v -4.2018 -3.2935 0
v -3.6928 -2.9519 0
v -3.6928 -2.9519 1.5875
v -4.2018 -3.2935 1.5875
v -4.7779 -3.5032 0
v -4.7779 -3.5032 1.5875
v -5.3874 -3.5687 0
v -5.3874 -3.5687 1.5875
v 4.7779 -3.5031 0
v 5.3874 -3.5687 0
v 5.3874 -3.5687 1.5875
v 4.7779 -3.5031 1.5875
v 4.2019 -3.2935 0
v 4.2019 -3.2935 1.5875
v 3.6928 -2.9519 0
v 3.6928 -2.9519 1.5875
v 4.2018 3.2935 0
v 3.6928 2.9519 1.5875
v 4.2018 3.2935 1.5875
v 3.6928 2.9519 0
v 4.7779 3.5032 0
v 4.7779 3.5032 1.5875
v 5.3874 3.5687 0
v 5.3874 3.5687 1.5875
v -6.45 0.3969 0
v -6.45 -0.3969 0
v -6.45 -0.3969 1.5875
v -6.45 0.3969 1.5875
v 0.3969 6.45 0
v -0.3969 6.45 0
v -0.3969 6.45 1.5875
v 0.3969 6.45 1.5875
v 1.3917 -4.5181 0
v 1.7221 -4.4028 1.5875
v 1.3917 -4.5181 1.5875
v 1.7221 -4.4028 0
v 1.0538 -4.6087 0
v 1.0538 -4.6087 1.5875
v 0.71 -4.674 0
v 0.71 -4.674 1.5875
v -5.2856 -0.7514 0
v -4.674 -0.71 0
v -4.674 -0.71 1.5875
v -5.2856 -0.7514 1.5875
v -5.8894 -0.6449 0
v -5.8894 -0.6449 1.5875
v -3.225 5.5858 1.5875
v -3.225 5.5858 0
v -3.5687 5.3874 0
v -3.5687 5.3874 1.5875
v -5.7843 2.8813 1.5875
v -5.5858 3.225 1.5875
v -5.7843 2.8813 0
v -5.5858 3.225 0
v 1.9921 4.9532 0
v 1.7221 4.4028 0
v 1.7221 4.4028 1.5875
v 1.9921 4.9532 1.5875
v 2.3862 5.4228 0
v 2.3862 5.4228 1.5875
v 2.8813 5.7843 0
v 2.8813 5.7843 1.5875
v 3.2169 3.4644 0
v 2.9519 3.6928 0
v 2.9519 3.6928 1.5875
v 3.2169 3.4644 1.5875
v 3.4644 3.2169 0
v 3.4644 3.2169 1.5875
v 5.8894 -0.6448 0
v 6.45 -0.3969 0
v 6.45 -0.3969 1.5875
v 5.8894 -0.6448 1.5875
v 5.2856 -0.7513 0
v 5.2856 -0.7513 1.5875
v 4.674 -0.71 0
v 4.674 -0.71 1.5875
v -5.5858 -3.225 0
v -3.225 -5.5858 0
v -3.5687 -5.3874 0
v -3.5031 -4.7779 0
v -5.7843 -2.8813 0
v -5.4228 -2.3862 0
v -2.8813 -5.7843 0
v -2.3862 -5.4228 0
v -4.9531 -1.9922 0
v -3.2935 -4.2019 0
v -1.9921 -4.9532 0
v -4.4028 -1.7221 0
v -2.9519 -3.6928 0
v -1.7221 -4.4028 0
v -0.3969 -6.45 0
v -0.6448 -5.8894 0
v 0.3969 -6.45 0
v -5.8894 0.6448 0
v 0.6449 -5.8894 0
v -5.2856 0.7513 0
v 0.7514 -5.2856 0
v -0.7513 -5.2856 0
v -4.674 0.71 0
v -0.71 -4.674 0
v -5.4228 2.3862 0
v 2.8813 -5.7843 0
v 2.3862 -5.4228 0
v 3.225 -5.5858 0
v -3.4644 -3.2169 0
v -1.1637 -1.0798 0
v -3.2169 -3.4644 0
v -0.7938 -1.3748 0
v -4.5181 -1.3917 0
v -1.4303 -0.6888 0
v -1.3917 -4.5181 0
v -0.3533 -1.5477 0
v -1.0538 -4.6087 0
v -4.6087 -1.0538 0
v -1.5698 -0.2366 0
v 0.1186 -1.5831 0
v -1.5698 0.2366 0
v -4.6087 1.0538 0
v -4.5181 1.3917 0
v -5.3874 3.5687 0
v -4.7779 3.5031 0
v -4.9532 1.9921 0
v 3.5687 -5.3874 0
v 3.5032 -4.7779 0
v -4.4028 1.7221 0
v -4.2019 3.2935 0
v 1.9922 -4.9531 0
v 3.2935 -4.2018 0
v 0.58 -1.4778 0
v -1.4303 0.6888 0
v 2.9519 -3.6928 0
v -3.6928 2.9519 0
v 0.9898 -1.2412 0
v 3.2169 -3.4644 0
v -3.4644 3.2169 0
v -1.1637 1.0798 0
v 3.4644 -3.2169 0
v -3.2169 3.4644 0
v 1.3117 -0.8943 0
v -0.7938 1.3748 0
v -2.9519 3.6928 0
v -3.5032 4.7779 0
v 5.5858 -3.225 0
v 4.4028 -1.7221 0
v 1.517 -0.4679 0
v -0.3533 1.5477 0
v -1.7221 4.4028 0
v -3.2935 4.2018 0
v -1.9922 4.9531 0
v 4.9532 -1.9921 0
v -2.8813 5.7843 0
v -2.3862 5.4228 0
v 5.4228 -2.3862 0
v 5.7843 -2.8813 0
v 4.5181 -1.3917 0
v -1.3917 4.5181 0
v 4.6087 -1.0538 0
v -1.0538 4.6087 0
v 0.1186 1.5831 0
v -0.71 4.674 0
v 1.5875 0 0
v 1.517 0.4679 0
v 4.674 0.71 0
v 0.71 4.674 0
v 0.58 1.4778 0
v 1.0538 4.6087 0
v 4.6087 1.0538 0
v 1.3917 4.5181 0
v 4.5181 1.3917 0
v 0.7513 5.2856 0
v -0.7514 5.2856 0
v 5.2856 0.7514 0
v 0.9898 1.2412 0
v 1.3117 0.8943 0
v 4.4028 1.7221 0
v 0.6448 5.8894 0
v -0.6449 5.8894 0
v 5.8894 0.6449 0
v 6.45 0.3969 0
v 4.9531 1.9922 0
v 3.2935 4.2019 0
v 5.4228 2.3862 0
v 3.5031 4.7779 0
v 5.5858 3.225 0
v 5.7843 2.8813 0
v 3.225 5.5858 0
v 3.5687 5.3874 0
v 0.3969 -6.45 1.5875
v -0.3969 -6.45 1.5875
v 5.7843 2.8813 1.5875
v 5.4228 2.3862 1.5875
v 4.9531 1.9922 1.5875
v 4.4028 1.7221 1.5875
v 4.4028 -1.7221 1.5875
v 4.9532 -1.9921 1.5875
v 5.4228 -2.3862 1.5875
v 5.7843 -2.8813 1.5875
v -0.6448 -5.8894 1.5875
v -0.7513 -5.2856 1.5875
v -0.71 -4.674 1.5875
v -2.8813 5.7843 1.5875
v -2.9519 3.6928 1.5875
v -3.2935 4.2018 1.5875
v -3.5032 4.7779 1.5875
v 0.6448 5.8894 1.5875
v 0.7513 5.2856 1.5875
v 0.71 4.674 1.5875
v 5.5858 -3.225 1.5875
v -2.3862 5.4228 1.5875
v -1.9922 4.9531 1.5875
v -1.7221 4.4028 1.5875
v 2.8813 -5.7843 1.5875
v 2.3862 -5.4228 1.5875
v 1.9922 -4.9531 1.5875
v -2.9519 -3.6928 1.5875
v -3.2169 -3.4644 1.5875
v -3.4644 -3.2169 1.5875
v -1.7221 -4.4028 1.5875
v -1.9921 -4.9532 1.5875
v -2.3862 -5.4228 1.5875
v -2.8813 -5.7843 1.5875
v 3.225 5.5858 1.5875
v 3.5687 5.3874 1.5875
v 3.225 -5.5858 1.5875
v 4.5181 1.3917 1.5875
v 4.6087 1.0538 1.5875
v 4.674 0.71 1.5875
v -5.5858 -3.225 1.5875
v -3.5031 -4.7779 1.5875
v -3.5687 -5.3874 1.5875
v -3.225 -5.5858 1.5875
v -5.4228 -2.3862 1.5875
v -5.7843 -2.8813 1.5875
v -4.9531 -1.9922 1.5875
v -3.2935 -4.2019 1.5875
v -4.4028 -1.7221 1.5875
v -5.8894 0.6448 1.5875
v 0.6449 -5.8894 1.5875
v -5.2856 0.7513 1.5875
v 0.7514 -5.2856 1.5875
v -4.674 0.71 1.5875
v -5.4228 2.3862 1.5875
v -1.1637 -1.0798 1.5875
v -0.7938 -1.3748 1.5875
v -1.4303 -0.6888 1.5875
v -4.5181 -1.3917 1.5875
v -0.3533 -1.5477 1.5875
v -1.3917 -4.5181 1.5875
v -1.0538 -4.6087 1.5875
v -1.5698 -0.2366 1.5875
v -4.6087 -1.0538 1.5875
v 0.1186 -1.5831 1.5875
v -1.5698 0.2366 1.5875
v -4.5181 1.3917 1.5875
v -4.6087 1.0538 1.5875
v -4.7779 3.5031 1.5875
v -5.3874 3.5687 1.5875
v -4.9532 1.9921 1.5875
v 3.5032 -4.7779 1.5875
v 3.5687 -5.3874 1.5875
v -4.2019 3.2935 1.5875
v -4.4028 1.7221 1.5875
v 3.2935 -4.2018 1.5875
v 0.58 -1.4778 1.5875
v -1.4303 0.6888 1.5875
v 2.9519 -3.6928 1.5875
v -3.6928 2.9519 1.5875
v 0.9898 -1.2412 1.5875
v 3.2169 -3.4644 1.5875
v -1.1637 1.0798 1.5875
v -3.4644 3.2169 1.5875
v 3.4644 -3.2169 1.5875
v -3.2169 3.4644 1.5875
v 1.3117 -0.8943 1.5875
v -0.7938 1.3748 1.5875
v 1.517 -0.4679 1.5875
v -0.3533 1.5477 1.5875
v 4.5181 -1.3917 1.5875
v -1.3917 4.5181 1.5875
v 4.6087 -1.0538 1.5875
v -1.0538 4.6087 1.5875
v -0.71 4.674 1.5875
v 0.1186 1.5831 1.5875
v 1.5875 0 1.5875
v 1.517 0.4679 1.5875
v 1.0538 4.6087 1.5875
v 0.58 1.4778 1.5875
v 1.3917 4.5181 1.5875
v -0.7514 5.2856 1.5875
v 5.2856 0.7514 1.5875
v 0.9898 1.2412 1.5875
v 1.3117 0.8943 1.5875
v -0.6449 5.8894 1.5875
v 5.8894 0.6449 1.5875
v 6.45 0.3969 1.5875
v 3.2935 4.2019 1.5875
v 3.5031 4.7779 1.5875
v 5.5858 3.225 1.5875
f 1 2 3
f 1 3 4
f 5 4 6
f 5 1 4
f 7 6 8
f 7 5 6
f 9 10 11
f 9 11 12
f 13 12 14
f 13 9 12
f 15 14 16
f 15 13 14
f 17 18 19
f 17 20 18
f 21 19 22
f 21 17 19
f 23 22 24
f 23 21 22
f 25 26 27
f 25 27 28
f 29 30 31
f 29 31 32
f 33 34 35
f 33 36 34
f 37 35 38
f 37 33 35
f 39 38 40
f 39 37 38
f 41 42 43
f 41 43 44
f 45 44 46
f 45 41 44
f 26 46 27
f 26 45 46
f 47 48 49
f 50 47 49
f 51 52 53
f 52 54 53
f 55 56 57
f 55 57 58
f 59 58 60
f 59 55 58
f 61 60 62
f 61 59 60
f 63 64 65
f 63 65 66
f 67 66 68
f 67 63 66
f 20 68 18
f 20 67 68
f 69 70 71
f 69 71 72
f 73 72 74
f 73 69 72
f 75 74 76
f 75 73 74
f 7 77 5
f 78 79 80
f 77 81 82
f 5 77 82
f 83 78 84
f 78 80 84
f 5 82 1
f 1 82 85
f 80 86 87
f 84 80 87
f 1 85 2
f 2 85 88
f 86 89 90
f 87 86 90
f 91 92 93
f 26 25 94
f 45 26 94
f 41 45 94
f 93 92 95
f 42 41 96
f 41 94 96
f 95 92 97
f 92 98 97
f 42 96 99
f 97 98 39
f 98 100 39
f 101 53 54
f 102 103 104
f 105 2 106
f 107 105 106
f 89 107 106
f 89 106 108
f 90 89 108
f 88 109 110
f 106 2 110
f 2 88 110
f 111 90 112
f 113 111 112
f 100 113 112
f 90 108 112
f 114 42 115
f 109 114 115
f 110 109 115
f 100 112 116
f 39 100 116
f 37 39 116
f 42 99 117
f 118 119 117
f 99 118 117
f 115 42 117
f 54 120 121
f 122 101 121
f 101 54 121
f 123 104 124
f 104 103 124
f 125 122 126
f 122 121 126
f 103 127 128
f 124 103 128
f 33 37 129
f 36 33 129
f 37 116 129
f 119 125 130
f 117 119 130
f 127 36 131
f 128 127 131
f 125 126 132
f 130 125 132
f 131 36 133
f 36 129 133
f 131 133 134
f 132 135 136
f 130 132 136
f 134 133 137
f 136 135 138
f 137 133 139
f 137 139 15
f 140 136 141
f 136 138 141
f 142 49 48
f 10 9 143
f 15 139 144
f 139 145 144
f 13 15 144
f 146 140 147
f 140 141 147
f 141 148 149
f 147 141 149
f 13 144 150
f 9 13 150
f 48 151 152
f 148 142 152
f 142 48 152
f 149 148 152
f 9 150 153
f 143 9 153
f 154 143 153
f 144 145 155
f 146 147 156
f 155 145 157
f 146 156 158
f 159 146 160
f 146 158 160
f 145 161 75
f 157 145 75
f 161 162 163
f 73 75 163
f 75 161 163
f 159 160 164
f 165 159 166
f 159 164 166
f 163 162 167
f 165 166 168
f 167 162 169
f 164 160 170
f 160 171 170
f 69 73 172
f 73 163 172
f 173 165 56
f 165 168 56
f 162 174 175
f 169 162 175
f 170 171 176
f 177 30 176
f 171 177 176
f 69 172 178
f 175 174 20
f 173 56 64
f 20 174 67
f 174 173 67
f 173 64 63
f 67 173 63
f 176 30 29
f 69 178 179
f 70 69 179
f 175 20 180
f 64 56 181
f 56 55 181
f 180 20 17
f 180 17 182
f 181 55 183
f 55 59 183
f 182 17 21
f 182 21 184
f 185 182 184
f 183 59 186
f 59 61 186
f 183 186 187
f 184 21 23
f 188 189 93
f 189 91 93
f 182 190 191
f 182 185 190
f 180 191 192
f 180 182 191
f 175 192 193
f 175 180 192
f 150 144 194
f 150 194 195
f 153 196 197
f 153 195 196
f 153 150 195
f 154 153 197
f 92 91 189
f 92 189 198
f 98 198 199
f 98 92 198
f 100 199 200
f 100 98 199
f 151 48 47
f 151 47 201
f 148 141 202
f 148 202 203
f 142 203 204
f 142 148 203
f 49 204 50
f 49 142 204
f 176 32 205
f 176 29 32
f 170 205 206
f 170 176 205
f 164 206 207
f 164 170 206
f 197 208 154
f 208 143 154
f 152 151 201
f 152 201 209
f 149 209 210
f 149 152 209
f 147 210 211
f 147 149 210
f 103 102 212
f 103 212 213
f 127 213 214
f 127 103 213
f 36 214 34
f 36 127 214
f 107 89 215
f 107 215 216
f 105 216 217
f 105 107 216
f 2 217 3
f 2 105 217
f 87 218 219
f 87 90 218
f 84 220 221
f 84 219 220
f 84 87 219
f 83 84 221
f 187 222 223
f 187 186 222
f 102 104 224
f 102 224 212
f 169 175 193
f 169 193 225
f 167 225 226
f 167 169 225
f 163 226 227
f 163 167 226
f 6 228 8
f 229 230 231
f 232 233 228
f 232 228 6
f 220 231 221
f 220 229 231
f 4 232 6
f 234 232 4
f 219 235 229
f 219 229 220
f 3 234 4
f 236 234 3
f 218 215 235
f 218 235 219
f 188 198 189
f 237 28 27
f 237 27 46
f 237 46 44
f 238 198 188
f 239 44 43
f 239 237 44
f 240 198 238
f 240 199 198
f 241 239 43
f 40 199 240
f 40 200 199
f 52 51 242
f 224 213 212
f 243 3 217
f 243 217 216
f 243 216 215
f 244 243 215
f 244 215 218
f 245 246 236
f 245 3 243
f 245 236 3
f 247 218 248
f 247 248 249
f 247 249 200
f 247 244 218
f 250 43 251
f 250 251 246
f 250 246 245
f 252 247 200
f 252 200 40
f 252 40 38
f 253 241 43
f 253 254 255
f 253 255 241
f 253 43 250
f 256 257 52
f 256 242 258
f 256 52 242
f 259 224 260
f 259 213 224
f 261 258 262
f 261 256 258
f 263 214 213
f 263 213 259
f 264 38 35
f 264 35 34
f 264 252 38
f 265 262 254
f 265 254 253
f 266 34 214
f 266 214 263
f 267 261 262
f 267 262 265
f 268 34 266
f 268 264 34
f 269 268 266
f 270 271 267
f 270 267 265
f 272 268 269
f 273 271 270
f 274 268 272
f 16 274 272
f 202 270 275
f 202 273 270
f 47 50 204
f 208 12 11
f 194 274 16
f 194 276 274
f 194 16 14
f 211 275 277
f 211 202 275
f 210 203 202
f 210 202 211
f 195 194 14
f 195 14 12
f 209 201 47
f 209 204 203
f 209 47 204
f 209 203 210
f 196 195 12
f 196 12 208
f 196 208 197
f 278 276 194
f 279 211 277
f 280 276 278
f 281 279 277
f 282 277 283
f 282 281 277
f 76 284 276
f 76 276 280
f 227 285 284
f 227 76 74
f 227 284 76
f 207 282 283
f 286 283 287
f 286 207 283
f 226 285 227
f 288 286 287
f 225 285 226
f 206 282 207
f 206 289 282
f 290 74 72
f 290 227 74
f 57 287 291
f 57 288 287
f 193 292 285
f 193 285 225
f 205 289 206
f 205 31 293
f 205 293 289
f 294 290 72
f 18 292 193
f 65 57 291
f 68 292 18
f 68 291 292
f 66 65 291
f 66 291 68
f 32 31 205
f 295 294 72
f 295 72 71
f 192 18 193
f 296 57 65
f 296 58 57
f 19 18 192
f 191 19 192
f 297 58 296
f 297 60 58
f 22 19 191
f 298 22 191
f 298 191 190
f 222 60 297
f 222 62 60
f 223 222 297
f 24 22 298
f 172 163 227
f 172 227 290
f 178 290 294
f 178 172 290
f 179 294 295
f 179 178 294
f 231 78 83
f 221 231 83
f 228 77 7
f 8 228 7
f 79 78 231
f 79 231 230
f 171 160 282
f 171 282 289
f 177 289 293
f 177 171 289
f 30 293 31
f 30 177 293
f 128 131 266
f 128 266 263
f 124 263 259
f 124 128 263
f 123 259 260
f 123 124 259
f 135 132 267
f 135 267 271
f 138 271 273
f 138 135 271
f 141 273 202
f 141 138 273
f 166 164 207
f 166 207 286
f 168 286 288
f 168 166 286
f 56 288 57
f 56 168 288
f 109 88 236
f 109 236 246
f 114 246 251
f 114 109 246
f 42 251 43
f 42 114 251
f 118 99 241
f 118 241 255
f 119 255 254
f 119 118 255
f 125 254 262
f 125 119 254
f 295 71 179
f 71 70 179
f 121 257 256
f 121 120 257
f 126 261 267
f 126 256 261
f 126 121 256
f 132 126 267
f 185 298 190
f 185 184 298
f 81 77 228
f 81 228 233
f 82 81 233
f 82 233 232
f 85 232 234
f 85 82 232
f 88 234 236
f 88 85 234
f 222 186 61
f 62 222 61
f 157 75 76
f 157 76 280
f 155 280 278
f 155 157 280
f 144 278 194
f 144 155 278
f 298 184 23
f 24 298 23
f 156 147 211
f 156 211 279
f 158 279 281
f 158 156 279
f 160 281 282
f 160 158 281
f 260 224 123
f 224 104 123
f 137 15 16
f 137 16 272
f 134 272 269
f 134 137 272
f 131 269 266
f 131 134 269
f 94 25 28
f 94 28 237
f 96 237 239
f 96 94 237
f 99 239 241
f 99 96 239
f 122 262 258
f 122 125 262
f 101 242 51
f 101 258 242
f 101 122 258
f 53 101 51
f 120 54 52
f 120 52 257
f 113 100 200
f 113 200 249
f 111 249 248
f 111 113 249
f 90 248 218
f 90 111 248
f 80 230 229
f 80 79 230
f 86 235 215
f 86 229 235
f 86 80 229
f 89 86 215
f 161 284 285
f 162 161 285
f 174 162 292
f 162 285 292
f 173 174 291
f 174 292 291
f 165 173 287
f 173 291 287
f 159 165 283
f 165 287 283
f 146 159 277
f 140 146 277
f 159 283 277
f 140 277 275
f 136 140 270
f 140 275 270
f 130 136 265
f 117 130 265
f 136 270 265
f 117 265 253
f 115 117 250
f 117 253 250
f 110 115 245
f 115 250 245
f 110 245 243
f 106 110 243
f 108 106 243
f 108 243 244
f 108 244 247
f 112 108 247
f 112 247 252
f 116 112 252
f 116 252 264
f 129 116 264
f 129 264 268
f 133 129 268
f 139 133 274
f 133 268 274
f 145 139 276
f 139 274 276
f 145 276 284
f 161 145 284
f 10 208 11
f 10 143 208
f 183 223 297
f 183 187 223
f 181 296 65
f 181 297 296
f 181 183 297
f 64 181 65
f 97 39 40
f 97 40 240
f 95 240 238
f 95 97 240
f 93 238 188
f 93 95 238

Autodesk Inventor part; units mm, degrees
ref_plane "YZ Plane" through (0, 0, 0) normal (1, 0, 0) x (0, 1, 0)
ref_plane "XZ Plane" through (0, 0, 0) normal (0, 1, 0) x (-1, 0, 0)
ref_plane "XY Plane" through (0, 0, 0) normal (0, 0, 1) x (1, 0, 0)
sketch "Sketch1" plane through (0, 0, 0) normal (0, 0, 1) x (1, 0, 0)
  line L0 (0, 0) -> (0, 20.872) construction
  line L1 (0, 0) -> (7.1878, 0) construction
  line L2 (0, 6.45) -> (0.3969, 6.45)
  line L3 (0.3969, 6.45) -> (0.71, 4.674) construction
  line L4 (0.5535, 5.562) -> (2.6468, 5.9311) construction
  arc A0 (0.71, 4.674) -> (0.3969, 6.45) centre (-1.785, 5.1496) ccw
  line L5 (0, 6.45) -> (-0.3969, 6.45)
  arc A1 (-0.3969, 6.45) -> (-0.71, 4.674) centre (1.785, 5.1496) ccw
  line L6 (-0.3969, 6.45) -> (0.3969, 6.45)
  line L7 (-0.3969, 6.45) -> (0.3969, 6.45)
  line L8 (-3.225, 5.5858) -> (-2.8813, 5.7843)
  arc A2 (-1.7221, 4.4028) -> (-2.8813, 5.7843) centre (-4.1207, 3.5672) ccw
  arc A3 (-3.5687, 5.3874) -> (-2.9519, 3.6928) centre (-1.0289, 5.3522) ccw
  line L9 (-3.225, 5.5858) -> (-3.5687, 5.3874)
  line L10 (-5.5858, 3.225) -> (-5.3874, 3.5687)
  arc A4 (-3.6928, 2.9519) -> (-5.3874, 3.5687) centre (-5.3522, 1.0289) ccw
  arc A5 (-5.7843, 2.8813) -> (-4.4028, 1.7221) centre (-3.5672, 4.1207) ccw
  line L11 (-5.5858, 3.225) -> (-5.7843, 2.8813)
  line L12 (-6.45, 0) -> (-6.45, 0.3969)
  arc A6 (-4.674, 0.71) -> (-6.45, 0.3969) centre (-5.1496, -1.785) ccw
  arc A7 (-6.45, -0.3969) -> (-4.674, -0.71) centre (-5.1496, 1.785) ccw
  line L13 (-6.45, 0) -> (-6.45, -0.3969)
  line L14 (-5.5858, -3.225) -> (-5.7843, -2.8813)
  arc A8 (-4.4028, -1.7221) -> (-5.7843, -2.8813) centre (-3.5672, -4.1207) ccw
  arc A9 (-5.3874, -3.5687) -> (-3.6928, -2.9519) centre (-5.3522, -1.0289) ccw
  line L15 (-5.5858, -3.225) -> (-5.3874, -3.5687)
  line L16 (-3.225, -5.5858) -> (-3.5687, -5.3874)
  arc A10 (-2.9519, -3.6928) -> (-3.5687, -5.3874) centre (-1.0289, -5.3522) ccw
  arc A11 (-2.8813, -5.7843) -> (-1.7221, -4.4028) centre (-4.1207, -3.5672) ccw
  line L17 (-3.225, -5.5858) -> (-2.8813, -5.7843)
  line L18 (0, -6.45) -> (-0.3969, -6.45)
  arc A12 (-0.71, -4.674) -> (-0.3969, -6.45) centre (1.785, -5.1496) ccw
  arc A13 (0.3969, -6.45) -> (0.71, -4.674) centre (-1.785, -5.1496) ccw
  line L19 (0, -6.45) -> (0.3969, -6.45)
  line L20 (3.225, -5.5858) -> (2.8813, -5.7843)
  arc A14 (1.7221, -4.4028) -> (2.8813, -5.7843) centre (4.1207, -3.5672) ccw
  arc A15 (3.5687, -5.3874) -> (2.9519, -3.6928) centre (1.0289, -5.3522) ccw
  line L21 (3.225, -5.5858) -> (3.5687, -5.3874)
  line L22 (5.5858, -3.225) -> (5.3874, -3.5687)
  arc A16 (3.6928, -2.9519) -> (5.3874, -3.5687) centre (5.3522, -1.0289) ccw
  arc A17 (5.7843, -2.8813) -> (4.4028, -1.7221) centre (3.5672, -4.1207) ccw
  line L23 (5.5858, -3.225) -> (5.7843, -2.8813)
  line L24 (6.45, 0) -> (6.45, -0.3969)
  arc A18 (4.674, -0.71) -> (6.45, -0.3969) centre (5.1496, 1.785) ccw
  arc A19 (6.45, 0.3969) -> (4.674, 0.71) centre (5.1496, -1.785) ccw
  line L25 (6.45, 0) -> (6.45, 0.3969)
  line L26 (5.5858, 3.225) -> (5.7843, 2.8813)
  arc A20 (4.4028, 1.7221) -> (5.7843, 2.8813) centre (3.5672, 4.1207) ccw
  arc A21 (5.3874, 3.5687) -> (3.6928, 2.9519) centre (5.3522, 1.0289) ccw
  line L27 (5.5858, 3.225) -> (5.3874, 3.5687)
  line L28 (3.225, 5.5858) -> (3.5687, 5.3874)
  arc A22 (2.9519, 3.6928) -> (3.5687, 5.3874) centre (1.0289, 5.3522) ccw
  arc A23 (2.8813, 5.7843) -> (1.7221, 4.4028) centre (4.1207, 3.5672) ccw
  line L29 (3.225, 5.5858) -> (2.8813, 5.7843)
  line L30 (-1.7221, 4.4028) -> (-0.71, 4.674) construction
  arc A24 (1.7221, 4.4028) -> (0.71, 4.674) centre (0, 0) ccw
  arc A25 (3.6928, 2.9519) -> (2.9519, 3.6928) centre (0, 0) ccw
  arc A26 (4.674, 0.71) -> (4.4028, 1.7221) centre (0, 0) ccw
  arc A27 (4.4028, -1.7221) -> (4.674, -0.71) centre (0, 0) ccw
  arc A28 (2.9519, -3.6928) -> (3.6928, -2.9519) centre (0, 0) ccw
  arc A29 (0.71, -4.674) -> (1.7221, -4.4028) centre (0, 0) ccw
  arc A30 (-1.7221, -4.4028) -> (-0.71, -4.674) centre (0, 0) ccw
  arc A31 (-3.6928, -2.9519) -> (-2.9519, -3.6928) centre (0, 0) ccw
  arc A32 (-4.674, -0.71) -> (-4.4028, -1.7221) centre (0, 0) ccw
  arc A33 (-4.4028, 1.7221) -> (-4.674, 0.71) centre (0, 0) ccw
  arc A34 (-0.71, 4.674) -> (-1.7221, 4.4028) centre (0, 0) ccw
  arc A35 (-2.9519, 3.6928) -> (-3.6928, 2.9519) centre (0, 0) ccw
  dimension "d0" = 0.7937
  dimension "d4" = 360
  dimension "d6" = 80
  dimension "d7" = 1.8034
  dimension "d8" = 2.54
  dimension "d11" = 1.0477
extrude "Extrusion1" add sketch "Sketch1" along normal blind 1.5875
sketch "Sketch2" plane through (0, 0, 1.5875) normal (0, 0, 1) x (1, 0, 0)
  arc A0 (1.7221, 4.4028) -> (0.71, 4.674) centre (0, 0) ccw projected
  circle A1 centre (0, 0) radius 1.5875
  dimension "d12" = 3.175
extrude "Extrusion2" cut sketch "Sketch2" against normal blind 1.5875
sketch "Sketch3" plane through (0, 0, 1.5875) normal (0, 0, 1) x (1, 0, 0)
  circle A0 centre (0, 0) radius 1.5875 projected
  arc A1 (-0.3969, 6.45) -> (-0.71, 4.674) centre (1.785, 5.1496) ccw projected
  arc A2 (-0.71, 4.674) -> (-1.7221, 4.4028) centre (0, 0) ccw projected
  arc A3 (-1.7221, 4.4028) -> (-2.8813, 5.7843) centre (-4.1207, 3.5672) ccw projected
  line L0 (-2.8813, 5.7843) -> (-3.5687, 5.3874) projected
  arc A4 (-3.5687, 5.3874) -> (-2.9519, 3.6928) centre (-1.0289, 5.3522) ccw projected
  arc A5 (-2.9519, 3.6928) -> (-3.6928, 2.9519) centre (0, 0) ccw projected
  arc A6 (-3.6928, 2.9519) -> (-5.3874, 3.5687) centre (-5.3522, 1.0289) ccw projected
  line L1 (-5.3874, 3.5687) -> (-5.7843, 2.8813) projected
  arc A7 (-5.7843, 2.8813) -> (-4.4028, 1.7221) centre (-3.5672, 4.1207) ccw projected
  arc A8 (-4.4028, 1.7221) -> (-4.674, 0.71) centre (0, 0) ccw projected
  arc A9 (-4.674, 0.71) -> (-6.45, 0.3969) centre (-5.1496, -1.785) ccw projected
  line L2 (-6.45, 0.3969) -> (-6.45, -0.3969) projected
  arc A10 (-6.45, -0.3969) -> (-4.674, -0.71) centre (-5.1496, 1.785) ccw projected
  arc A11 (-4.674, -0.71) -> (-4.4028, -1.7221) centre (0, 0) ccw projected
  arc A12 (-4.4028, -1.7221) -> (-5.7843, -2.8813) centre (-3.5672, -4.1207) ccw projected
  line L3 (-5.7843, -2.8813) -> (-5.3874, -3.5687) projected
  arc A13 (-5.3874, -3.5687) -> (-3.6928, -2.9519) centre (-5.3522, -1.0289) ccw projected
  arc A14 (-3.6928, -2.9519) -> (-2.9519, -3.6928) centre (0, 0) ccw projected
  arc A15 (-2.9519, -3.6928) -> (-3.5687, -5.3874) centre (-1.0289, -5.3522) ccw projected
  line L4 (-3.5687, -5.3874) -> (-2.8813, -5.7843) projected
  arc A16 (-2.8813, -5.7843) -> (-1.7221, -4.4028) centre (-4.1207, -3.5672) ccw projected
  arc A17 (-1.7221, -4.4028) -> (-0.71, -4.674) centre (0, 0) ccw projected
  arc A18 (-0.71, -4.674) -> (-0.3969, -6.45) centre (1.785, -5.1496) ccw projected
  line L5 (-0.3969, -6.45) -> (0.3969, -6.45) projected
  arc A19 (0.3969, -6.45) -> (0.71, -4.674) centre (-1.785, -5.1496) ccw projected
  arc A20 (0.71, -4.674) -> (1.7221, -4.4028) centre (0, 0) ccw projected
  arc A21 (1.7221, -4.4028) -> (2.8813, -5.7843) centre (4.1207, -3.5672) ccw projected
  line L6 (2.8813, -5.7843) -> (3.5687, -5.3874) projected
  arc A22 (3.5687, -5.3874) -> (2.9519, -3.6928) centre (1.0289, -5.3522) ccw projected
  arc A23 (2.9519, -3.6928) -> (3.6928, -2.9519) centre (0, 0) ccw projected
  arc A24 (3.6928, -2.9519) -> (5.3874, -3.5687) centre (5.3522, -1.0289) ccw projected
  line L7 (5.3874, -3.5687) -> (5.7843, -2.8813) projected
  arc A25 (5.7843, -2.8813) -> (4.4028, -1.7221) centre (3.5672, -4.1207) ccw projected
  arc A26 (4.4028, -1.7221) -> (4.674, -0.71) centre (0, 0) ccw projected
  arc A27 (4.674, -0.71) -> (6.45, -0.3969) centre (5.1496, 1.785) ccw projected
  line L8 (6.45, -0.3969) -> (6.45, 0.3969) projected
  arc A28 (6.45, 0.3969) -> (4.674, 0.71) centre (5.1496, -1.785) ccw projected
  arc A29 (4.674, 0.71) -> (4.4028, 1.7221) centre (0, 0) ccw projected
  arc A30 (4.4028, 1.7221) -> (5.7843, 2.8813) centre (3.5672, 4.1207) ccw projected
  line L9 (5.7843, 2.8813) -> (5.3874, 3.5687) projected
  arc A31 (5.3874, 3.5687) -> (3.6928, 2.9519) centre (5.3522, 1.0289) ccw projected
  arc A32 (3.6928, 2.9519) -> (2.9519, 3.6928) centre (0, 0) ccw projected
  arc A33 (2.9519, 3.6928) -> (3.5687, 5.3874) centre (1.0289, 5.3522) ccw projected
  line L10 (3.5687, 5.3874) -> (2.8813, 5.7843) projected
  arc A34 (2.8813, 5.7843) -> (1.7221, 4.4028) centre (4.1207, 3.5672) ccw projected
  arc A35 (1.7221, 4.4028) -> (0.71, 4.674) centre (0, 0) ccw projected
  arc A36 (0.71, 4.674) -> (0.3969, 6.45) centre (-1.785, 5.1496) ccw projected
  line L11 (0.3969, 6.45) -> (-0.3969, 6.45) projected
  line L12 (-0.71, 4.674) -> (0.71, 4.674)
  arc A37 (0.71, 4.674) -> (0.3969, 6.45) centre (-1.785, 5.1496) ccw
  line L13 (0.3969, 6.45) -> (-0.3969, 6.45)
  arc A38 (-0.3969, 6.45) -> (-0.71, 4.674) centre (1.785, 5.1496) ccw
properties part number "Sun"
